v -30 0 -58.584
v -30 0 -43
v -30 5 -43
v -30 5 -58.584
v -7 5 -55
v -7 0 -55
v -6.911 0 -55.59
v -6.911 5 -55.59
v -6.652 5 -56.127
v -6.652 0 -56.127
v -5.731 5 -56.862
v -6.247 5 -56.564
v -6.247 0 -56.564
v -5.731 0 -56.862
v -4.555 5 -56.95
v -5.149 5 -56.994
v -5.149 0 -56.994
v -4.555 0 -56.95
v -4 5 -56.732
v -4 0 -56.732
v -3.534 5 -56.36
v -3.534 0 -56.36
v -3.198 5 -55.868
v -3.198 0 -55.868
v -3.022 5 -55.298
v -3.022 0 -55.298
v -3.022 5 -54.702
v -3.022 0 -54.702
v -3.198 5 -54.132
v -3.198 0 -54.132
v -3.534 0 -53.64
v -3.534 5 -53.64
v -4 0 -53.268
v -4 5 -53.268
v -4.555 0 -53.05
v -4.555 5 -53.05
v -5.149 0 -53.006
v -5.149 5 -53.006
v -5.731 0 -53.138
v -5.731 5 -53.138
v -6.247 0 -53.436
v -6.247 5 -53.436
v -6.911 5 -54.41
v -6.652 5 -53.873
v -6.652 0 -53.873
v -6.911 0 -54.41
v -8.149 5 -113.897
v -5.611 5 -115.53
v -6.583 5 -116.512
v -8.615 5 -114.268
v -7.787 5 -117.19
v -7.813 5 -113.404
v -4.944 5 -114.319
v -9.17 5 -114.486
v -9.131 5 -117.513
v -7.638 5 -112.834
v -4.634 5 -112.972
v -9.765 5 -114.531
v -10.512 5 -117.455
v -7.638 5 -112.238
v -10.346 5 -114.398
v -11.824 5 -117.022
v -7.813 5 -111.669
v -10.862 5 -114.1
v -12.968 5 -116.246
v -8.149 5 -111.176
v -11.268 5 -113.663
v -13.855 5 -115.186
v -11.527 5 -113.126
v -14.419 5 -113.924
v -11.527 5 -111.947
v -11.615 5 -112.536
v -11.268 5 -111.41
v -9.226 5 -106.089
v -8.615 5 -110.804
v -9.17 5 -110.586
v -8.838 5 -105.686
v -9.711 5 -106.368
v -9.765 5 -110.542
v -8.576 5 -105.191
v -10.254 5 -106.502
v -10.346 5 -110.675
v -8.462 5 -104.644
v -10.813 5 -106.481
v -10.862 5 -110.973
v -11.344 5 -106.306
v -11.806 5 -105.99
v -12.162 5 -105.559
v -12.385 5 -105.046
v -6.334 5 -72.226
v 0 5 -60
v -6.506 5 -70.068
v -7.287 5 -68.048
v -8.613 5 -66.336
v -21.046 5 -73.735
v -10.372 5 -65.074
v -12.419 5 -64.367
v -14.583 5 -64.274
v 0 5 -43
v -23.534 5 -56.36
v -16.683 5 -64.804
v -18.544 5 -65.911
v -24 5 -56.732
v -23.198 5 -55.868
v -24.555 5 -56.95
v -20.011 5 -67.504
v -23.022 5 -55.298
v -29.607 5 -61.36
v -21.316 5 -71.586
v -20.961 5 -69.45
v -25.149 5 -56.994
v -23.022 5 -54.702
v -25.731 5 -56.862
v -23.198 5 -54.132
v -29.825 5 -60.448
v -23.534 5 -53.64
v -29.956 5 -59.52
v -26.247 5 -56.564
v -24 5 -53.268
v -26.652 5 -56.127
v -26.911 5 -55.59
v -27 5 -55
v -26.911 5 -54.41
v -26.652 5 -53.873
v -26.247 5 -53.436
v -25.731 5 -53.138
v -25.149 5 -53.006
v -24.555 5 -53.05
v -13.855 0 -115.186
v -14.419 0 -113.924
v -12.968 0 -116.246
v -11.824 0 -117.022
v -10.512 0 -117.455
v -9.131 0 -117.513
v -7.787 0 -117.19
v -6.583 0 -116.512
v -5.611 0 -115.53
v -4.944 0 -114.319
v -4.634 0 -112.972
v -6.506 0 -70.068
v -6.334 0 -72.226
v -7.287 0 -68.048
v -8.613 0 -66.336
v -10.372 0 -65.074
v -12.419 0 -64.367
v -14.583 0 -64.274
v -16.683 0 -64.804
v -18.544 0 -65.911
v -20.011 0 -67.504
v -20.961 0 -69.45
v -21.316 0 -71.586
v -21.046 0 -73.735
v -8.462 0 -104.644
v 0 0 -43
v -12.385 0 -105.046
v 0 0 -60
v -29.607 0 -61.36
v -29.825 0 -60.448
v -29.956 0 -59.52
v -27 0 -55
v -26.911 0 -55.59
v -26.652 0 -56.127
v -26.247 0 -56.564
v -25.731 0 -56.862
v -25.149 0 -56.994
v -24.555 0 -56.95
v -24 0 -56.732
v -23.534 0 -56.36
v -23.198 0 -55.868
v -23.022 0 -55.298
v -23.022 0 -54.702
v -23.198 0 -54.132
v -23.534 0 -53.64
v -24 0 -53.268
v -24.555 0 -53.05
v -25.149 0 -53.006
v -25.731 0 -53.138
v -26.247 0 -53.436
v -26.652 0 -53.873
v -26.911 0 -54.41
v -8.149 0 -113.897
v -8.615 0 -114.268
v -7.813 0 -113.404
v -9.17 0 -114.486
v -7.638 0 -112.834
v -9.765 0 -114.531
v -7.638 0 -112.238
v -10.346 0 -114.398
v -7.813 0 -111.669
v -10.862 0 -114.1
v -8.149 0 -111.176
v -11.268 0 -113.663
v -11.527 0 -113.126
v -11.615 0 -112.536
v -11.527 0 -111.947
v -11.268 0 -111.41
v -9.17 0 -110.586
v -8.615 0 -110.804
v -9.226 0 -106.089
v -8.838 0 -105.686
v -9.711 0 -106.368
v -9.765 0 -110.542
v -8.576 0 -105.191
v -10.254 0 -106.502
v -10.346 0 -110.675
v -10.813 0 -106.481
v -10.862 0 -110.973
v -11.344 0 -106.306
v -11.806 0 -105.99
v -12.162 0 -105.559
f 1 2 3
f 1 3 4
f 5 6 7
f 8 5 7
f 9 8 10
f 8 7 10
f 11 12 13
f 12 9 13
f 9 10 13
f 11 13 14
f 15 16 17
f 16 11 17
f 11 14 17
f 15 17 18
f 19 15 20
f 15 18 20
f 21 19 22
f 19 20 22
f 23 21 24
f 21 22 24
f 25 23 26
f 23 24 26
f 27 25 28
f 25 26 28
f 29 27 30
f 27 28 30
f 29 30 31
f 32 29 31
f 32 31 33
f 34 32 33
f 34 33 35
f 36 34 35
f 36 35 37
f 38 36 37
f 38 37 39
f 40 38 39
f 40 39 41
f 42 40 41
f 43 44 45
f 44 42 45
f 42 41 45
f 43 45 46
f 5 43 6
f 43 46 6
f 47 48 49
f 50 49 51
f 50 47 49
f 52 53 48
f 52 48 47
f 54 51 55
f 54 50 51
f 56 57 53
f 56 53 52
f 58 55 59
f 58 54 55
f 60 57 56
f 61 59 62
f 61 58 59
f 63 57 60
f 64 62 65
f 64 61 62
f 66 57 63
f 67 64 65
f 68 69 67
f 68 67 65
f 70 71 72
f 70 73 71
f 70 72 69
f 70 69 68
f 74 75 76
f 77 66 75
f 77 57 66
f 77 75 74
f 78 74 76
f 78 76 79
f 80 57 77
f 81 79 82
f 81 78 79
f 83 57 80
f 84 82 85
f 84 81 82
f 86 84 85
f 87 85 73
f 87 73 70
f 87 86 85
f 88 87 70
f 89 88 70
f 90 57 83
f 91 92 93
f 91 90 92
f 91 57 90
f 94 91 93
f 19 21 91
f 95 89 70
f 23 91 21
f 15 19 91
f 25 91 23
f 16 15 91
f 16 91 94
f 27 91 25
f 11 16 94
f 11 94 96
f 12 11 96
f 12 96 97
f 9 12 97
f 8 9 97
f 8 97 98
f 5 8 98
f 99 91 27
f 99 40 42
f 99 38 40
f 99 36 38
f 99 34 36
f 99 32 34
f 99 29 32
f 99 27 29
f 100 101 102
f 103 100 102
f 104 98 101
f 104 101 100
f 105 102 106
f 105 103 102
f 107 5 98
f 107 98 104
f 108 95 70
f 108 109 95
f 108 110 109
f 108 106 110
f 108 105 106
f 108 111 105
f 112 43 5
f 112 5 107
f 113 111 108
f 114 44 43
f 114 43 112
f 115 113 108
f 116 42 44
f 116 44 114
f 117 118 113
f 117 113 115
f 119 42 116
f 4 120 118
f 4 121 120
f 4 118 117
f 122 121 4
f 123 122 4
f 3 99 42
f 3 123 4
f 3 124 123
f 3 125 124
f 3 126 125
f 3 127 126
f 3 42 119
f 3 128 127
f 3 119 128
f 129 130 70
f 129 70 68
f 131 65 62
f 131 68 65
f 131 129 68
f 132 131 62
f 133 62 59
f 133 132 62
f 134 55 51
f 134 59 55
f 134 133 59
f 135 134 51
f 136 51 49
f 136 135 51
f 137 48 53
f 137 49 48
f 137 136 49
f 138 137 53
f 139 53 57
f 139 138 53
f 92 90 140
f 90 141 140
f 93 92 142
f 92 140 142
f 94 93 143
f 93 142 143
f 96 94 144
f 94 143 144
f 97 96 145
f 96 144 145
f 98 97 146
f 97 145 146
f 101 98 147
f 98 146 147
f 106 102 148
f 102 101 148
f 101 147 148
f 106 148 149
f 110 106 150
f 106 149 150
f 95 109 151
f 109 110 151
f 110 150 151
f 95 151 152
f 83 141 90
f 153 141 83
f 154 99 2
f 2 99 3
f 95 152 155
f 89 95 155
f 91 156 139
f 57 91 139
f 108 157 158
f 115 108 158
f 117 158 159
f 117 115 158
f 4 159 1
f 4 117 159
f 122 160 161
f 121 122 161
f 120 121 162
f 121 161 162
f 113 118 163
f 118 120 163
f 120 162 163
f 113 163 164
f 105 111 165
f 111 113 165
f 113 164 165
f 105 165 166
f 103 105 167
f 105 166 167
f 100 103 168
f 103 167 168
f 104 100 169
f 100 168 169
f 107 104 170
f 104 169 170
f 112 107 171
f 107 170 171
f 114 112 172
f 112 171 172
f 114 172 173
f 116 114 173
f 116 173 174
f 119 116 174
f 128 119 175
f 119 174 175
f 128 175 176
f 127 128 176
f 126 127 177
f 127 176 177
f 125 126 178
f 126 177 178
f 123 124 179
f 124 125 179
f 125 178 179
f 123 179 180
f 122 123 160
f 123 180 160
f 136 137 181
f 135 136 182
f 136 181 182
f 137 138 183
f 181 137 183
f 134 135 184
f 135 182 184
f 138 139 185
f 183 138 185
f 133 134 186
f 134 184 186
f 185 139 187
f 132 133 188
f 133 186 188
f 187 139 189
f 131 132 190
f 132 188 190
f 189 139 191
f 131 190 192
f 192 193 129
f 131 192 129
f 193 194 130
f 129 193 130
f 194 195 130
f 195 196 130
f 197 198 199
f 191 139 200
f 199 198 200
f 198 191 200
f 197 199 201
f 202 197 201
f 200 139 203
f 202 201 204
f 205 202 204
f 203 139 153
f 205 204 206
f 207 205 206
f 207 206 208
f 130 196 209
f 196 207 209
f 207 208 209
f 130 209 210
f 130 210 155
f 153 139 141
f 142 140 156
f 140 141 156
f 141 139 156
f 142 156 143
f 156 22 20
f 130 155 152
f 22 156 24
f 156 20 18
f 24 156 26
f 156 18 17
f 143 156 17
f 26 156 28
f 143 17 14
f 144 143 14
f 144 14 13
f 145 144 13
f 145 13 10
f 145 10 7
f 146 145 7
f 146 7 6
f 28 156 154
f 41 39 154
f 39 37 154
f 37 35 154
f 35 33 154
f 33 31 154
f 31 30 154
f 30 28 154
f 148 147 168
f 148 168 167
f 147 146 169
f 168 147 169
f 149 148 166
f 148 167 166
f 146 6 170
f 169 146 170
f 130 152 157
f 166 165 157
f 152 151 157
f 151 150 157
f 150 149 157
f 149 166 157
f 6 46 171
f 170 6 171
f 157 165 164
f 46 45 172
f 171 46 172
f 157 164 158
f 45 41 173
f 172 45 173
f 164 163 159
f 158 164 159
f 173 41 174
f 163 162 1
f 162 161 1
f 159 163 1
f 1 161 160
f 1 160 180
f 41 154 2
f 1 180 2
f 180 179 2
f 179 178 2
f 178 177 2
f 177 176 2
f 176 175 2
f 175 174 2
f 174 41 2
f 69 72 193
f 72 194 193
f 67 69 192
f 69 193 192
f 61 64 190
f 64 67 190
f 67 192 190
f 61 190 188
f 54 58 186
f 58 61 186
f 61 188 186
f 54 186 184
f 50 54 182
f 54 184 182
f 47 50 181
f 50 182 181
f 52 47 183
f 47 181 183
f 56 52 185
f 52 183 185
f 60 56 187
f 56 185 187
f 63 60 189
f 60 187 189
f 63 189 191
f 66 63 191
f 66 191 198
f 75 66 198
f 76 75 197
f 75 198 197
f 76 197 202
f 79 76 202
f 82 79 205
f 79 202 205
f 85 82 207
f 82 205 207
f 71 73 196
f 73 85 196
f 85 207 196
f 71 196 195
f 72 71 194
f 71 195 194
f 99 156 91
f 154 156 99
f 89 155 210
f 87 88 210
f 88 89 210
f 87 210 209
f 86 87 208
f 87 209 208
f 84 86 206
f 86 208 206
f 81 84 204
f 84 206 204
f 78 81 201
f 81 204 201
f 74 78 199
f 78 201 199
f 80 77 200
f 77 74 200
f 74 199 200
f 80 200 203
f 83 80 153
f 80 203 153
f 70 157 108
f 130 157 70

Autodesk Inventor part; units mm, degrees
ref_plane "YZ Plane" through (0, 0, 0) normal (1, 0, 0) x (0, 1, 0)
ref_plane "XZ Plane" through (0, 0, 0) normal (0, 1, 0) x (-1, 0, 0)
ref_plane "XY Plane" through (0, 0, 0) normal (0, 0, 1) x (1, 0, 0)
sketch "Boceto1" plane through (0, 0, 0) normal (1, 0, 0) x (0, 1, 0)
  point P0 (0, 0)
sketch "Boceto2" plane through (0, 0, 0) normal (0, 1, 0) x (-1, 0, 0)
  line L0 (0, 0) -> (30, 0)
  line L1 (30, 0) -> (30, -60)
  line L2 (30, -60) -> (0, -60)
  line L3 (0, -60) -> (0, 0)
  circle A0 centre (25, -5) radius 2
  line L4 (30, -30) -> (0, -30) construction
  circle A1 centre (25, -55) radius 2
  line L5 (15, 0) -> (15, -60) construction
  circle A2 centre (5, -5) radius 2
  circle A3 centre (5, -55) radius 2
  line L6 (0, -60) -> (4.6345, -112.9721)
  line L7 (0, -60) -> (53.1744, -60) construction
  line L8 (30, -60) -> (14.4189, -113.9242)
  line L9 (0, 0) -> (4.6345, 52.9721)
  line L10 (30, 0) -> (14.4189, 53.9242)
  arc A4 (14.4189, 53.9242) -> (4.6345, 52.9721) centre (9.6154, 52.5363) ccw
  arc A5 (4.6345, -112.9721) -> (14.4189, -113.9242) centre (9.6154, -112.5363) ccw
  circle A6 centre (9.6154, -112.5363) radius 2
  circle A7 centre (9.6154, 52.5363) radius 2
  line L11 (15, -60) -> (9.1311, -117.5128) construction
  line L12 (1.0267, -71.7351) -> (26.6092, -71.7351) construction
  arc A8 (21.0465, -73.7346) -> (6.3341, -72.2264) centre (13.818, -71.7351) ccw
  arc A9 (8.462, -104.6439) -> (12.3853, -105.0461) centre (10.4577, -104.5129) ccw
  line L13 (21.0465, -73.7346) -> (12.3853, -105.0461)
  line L14 (6.3018, -71.7351) -> (8.462, -104.6439)
  arc A10 (6.3341, 12.2264) -> (21.0465, 13.7346) centre (13.818, 11.7351) ccw
  arc A11 (12.3853, 45.0461) -> (8.462, 44.6439) centre (10.4577, 44.5129) ccw
  line L15 (21.0465, 13.7346) -> (12.3853, 45.0461)
  line L16 (6.3018, 11.7351) -> (8.462, 44.6439)
  point P0 (6.9725, -139.6956)
  point P1 (6.9725, 79.6956)
  dimension "d0" = 30
  dimension "d1" = 60
  dimension "d2" = 4
  dimension "d4" = 5
  dimension "d5" = 5
  dimension "d6" = 80
  dimension "d7" = 85
  dimension "d8" = 5
  dimension "d9" = 4
  dimension "d10" = 4
  dimension "d11" = 15
  dimension "d12" = 4
  dimension "d13" = 0.654
extrude "Extrusión1" add sketch "Boceto2" along normal blind 5
sketch "Boceto3" plane through (0, 5, 0) normal (0, 1, 0) x (1, 0, 0)
  point P0 (0, 0)
fillet "Empalme1" radius 10 2 edges at (-30, 2.5, 0) (-30, 2.5, -60)
sketch "Boceto5" plane through (0, 5, 0) normal (0, 1, 0) x (1, 0, 0)
  circle A0 centre (-5, 55) radius 2 construction
  line L0 (-5, 53) -> (-5, 43) construction
  line L1 (6.8466, 43) -> (-33.4625, 43)
  line L2 (-33.4625, 43) -> (-33.4625, -74.7352)
  line L3 (-33.4625, -74.7352) -> (6.8466, -74.7352)
  line L4 (6.8466, -74.7352) -> (6.8466, 43)
  point P0 (0, 0)
  dimension "d18" = 10
extrude "Extrusión2" cut sketch "Boceto5" against normal blind 10
